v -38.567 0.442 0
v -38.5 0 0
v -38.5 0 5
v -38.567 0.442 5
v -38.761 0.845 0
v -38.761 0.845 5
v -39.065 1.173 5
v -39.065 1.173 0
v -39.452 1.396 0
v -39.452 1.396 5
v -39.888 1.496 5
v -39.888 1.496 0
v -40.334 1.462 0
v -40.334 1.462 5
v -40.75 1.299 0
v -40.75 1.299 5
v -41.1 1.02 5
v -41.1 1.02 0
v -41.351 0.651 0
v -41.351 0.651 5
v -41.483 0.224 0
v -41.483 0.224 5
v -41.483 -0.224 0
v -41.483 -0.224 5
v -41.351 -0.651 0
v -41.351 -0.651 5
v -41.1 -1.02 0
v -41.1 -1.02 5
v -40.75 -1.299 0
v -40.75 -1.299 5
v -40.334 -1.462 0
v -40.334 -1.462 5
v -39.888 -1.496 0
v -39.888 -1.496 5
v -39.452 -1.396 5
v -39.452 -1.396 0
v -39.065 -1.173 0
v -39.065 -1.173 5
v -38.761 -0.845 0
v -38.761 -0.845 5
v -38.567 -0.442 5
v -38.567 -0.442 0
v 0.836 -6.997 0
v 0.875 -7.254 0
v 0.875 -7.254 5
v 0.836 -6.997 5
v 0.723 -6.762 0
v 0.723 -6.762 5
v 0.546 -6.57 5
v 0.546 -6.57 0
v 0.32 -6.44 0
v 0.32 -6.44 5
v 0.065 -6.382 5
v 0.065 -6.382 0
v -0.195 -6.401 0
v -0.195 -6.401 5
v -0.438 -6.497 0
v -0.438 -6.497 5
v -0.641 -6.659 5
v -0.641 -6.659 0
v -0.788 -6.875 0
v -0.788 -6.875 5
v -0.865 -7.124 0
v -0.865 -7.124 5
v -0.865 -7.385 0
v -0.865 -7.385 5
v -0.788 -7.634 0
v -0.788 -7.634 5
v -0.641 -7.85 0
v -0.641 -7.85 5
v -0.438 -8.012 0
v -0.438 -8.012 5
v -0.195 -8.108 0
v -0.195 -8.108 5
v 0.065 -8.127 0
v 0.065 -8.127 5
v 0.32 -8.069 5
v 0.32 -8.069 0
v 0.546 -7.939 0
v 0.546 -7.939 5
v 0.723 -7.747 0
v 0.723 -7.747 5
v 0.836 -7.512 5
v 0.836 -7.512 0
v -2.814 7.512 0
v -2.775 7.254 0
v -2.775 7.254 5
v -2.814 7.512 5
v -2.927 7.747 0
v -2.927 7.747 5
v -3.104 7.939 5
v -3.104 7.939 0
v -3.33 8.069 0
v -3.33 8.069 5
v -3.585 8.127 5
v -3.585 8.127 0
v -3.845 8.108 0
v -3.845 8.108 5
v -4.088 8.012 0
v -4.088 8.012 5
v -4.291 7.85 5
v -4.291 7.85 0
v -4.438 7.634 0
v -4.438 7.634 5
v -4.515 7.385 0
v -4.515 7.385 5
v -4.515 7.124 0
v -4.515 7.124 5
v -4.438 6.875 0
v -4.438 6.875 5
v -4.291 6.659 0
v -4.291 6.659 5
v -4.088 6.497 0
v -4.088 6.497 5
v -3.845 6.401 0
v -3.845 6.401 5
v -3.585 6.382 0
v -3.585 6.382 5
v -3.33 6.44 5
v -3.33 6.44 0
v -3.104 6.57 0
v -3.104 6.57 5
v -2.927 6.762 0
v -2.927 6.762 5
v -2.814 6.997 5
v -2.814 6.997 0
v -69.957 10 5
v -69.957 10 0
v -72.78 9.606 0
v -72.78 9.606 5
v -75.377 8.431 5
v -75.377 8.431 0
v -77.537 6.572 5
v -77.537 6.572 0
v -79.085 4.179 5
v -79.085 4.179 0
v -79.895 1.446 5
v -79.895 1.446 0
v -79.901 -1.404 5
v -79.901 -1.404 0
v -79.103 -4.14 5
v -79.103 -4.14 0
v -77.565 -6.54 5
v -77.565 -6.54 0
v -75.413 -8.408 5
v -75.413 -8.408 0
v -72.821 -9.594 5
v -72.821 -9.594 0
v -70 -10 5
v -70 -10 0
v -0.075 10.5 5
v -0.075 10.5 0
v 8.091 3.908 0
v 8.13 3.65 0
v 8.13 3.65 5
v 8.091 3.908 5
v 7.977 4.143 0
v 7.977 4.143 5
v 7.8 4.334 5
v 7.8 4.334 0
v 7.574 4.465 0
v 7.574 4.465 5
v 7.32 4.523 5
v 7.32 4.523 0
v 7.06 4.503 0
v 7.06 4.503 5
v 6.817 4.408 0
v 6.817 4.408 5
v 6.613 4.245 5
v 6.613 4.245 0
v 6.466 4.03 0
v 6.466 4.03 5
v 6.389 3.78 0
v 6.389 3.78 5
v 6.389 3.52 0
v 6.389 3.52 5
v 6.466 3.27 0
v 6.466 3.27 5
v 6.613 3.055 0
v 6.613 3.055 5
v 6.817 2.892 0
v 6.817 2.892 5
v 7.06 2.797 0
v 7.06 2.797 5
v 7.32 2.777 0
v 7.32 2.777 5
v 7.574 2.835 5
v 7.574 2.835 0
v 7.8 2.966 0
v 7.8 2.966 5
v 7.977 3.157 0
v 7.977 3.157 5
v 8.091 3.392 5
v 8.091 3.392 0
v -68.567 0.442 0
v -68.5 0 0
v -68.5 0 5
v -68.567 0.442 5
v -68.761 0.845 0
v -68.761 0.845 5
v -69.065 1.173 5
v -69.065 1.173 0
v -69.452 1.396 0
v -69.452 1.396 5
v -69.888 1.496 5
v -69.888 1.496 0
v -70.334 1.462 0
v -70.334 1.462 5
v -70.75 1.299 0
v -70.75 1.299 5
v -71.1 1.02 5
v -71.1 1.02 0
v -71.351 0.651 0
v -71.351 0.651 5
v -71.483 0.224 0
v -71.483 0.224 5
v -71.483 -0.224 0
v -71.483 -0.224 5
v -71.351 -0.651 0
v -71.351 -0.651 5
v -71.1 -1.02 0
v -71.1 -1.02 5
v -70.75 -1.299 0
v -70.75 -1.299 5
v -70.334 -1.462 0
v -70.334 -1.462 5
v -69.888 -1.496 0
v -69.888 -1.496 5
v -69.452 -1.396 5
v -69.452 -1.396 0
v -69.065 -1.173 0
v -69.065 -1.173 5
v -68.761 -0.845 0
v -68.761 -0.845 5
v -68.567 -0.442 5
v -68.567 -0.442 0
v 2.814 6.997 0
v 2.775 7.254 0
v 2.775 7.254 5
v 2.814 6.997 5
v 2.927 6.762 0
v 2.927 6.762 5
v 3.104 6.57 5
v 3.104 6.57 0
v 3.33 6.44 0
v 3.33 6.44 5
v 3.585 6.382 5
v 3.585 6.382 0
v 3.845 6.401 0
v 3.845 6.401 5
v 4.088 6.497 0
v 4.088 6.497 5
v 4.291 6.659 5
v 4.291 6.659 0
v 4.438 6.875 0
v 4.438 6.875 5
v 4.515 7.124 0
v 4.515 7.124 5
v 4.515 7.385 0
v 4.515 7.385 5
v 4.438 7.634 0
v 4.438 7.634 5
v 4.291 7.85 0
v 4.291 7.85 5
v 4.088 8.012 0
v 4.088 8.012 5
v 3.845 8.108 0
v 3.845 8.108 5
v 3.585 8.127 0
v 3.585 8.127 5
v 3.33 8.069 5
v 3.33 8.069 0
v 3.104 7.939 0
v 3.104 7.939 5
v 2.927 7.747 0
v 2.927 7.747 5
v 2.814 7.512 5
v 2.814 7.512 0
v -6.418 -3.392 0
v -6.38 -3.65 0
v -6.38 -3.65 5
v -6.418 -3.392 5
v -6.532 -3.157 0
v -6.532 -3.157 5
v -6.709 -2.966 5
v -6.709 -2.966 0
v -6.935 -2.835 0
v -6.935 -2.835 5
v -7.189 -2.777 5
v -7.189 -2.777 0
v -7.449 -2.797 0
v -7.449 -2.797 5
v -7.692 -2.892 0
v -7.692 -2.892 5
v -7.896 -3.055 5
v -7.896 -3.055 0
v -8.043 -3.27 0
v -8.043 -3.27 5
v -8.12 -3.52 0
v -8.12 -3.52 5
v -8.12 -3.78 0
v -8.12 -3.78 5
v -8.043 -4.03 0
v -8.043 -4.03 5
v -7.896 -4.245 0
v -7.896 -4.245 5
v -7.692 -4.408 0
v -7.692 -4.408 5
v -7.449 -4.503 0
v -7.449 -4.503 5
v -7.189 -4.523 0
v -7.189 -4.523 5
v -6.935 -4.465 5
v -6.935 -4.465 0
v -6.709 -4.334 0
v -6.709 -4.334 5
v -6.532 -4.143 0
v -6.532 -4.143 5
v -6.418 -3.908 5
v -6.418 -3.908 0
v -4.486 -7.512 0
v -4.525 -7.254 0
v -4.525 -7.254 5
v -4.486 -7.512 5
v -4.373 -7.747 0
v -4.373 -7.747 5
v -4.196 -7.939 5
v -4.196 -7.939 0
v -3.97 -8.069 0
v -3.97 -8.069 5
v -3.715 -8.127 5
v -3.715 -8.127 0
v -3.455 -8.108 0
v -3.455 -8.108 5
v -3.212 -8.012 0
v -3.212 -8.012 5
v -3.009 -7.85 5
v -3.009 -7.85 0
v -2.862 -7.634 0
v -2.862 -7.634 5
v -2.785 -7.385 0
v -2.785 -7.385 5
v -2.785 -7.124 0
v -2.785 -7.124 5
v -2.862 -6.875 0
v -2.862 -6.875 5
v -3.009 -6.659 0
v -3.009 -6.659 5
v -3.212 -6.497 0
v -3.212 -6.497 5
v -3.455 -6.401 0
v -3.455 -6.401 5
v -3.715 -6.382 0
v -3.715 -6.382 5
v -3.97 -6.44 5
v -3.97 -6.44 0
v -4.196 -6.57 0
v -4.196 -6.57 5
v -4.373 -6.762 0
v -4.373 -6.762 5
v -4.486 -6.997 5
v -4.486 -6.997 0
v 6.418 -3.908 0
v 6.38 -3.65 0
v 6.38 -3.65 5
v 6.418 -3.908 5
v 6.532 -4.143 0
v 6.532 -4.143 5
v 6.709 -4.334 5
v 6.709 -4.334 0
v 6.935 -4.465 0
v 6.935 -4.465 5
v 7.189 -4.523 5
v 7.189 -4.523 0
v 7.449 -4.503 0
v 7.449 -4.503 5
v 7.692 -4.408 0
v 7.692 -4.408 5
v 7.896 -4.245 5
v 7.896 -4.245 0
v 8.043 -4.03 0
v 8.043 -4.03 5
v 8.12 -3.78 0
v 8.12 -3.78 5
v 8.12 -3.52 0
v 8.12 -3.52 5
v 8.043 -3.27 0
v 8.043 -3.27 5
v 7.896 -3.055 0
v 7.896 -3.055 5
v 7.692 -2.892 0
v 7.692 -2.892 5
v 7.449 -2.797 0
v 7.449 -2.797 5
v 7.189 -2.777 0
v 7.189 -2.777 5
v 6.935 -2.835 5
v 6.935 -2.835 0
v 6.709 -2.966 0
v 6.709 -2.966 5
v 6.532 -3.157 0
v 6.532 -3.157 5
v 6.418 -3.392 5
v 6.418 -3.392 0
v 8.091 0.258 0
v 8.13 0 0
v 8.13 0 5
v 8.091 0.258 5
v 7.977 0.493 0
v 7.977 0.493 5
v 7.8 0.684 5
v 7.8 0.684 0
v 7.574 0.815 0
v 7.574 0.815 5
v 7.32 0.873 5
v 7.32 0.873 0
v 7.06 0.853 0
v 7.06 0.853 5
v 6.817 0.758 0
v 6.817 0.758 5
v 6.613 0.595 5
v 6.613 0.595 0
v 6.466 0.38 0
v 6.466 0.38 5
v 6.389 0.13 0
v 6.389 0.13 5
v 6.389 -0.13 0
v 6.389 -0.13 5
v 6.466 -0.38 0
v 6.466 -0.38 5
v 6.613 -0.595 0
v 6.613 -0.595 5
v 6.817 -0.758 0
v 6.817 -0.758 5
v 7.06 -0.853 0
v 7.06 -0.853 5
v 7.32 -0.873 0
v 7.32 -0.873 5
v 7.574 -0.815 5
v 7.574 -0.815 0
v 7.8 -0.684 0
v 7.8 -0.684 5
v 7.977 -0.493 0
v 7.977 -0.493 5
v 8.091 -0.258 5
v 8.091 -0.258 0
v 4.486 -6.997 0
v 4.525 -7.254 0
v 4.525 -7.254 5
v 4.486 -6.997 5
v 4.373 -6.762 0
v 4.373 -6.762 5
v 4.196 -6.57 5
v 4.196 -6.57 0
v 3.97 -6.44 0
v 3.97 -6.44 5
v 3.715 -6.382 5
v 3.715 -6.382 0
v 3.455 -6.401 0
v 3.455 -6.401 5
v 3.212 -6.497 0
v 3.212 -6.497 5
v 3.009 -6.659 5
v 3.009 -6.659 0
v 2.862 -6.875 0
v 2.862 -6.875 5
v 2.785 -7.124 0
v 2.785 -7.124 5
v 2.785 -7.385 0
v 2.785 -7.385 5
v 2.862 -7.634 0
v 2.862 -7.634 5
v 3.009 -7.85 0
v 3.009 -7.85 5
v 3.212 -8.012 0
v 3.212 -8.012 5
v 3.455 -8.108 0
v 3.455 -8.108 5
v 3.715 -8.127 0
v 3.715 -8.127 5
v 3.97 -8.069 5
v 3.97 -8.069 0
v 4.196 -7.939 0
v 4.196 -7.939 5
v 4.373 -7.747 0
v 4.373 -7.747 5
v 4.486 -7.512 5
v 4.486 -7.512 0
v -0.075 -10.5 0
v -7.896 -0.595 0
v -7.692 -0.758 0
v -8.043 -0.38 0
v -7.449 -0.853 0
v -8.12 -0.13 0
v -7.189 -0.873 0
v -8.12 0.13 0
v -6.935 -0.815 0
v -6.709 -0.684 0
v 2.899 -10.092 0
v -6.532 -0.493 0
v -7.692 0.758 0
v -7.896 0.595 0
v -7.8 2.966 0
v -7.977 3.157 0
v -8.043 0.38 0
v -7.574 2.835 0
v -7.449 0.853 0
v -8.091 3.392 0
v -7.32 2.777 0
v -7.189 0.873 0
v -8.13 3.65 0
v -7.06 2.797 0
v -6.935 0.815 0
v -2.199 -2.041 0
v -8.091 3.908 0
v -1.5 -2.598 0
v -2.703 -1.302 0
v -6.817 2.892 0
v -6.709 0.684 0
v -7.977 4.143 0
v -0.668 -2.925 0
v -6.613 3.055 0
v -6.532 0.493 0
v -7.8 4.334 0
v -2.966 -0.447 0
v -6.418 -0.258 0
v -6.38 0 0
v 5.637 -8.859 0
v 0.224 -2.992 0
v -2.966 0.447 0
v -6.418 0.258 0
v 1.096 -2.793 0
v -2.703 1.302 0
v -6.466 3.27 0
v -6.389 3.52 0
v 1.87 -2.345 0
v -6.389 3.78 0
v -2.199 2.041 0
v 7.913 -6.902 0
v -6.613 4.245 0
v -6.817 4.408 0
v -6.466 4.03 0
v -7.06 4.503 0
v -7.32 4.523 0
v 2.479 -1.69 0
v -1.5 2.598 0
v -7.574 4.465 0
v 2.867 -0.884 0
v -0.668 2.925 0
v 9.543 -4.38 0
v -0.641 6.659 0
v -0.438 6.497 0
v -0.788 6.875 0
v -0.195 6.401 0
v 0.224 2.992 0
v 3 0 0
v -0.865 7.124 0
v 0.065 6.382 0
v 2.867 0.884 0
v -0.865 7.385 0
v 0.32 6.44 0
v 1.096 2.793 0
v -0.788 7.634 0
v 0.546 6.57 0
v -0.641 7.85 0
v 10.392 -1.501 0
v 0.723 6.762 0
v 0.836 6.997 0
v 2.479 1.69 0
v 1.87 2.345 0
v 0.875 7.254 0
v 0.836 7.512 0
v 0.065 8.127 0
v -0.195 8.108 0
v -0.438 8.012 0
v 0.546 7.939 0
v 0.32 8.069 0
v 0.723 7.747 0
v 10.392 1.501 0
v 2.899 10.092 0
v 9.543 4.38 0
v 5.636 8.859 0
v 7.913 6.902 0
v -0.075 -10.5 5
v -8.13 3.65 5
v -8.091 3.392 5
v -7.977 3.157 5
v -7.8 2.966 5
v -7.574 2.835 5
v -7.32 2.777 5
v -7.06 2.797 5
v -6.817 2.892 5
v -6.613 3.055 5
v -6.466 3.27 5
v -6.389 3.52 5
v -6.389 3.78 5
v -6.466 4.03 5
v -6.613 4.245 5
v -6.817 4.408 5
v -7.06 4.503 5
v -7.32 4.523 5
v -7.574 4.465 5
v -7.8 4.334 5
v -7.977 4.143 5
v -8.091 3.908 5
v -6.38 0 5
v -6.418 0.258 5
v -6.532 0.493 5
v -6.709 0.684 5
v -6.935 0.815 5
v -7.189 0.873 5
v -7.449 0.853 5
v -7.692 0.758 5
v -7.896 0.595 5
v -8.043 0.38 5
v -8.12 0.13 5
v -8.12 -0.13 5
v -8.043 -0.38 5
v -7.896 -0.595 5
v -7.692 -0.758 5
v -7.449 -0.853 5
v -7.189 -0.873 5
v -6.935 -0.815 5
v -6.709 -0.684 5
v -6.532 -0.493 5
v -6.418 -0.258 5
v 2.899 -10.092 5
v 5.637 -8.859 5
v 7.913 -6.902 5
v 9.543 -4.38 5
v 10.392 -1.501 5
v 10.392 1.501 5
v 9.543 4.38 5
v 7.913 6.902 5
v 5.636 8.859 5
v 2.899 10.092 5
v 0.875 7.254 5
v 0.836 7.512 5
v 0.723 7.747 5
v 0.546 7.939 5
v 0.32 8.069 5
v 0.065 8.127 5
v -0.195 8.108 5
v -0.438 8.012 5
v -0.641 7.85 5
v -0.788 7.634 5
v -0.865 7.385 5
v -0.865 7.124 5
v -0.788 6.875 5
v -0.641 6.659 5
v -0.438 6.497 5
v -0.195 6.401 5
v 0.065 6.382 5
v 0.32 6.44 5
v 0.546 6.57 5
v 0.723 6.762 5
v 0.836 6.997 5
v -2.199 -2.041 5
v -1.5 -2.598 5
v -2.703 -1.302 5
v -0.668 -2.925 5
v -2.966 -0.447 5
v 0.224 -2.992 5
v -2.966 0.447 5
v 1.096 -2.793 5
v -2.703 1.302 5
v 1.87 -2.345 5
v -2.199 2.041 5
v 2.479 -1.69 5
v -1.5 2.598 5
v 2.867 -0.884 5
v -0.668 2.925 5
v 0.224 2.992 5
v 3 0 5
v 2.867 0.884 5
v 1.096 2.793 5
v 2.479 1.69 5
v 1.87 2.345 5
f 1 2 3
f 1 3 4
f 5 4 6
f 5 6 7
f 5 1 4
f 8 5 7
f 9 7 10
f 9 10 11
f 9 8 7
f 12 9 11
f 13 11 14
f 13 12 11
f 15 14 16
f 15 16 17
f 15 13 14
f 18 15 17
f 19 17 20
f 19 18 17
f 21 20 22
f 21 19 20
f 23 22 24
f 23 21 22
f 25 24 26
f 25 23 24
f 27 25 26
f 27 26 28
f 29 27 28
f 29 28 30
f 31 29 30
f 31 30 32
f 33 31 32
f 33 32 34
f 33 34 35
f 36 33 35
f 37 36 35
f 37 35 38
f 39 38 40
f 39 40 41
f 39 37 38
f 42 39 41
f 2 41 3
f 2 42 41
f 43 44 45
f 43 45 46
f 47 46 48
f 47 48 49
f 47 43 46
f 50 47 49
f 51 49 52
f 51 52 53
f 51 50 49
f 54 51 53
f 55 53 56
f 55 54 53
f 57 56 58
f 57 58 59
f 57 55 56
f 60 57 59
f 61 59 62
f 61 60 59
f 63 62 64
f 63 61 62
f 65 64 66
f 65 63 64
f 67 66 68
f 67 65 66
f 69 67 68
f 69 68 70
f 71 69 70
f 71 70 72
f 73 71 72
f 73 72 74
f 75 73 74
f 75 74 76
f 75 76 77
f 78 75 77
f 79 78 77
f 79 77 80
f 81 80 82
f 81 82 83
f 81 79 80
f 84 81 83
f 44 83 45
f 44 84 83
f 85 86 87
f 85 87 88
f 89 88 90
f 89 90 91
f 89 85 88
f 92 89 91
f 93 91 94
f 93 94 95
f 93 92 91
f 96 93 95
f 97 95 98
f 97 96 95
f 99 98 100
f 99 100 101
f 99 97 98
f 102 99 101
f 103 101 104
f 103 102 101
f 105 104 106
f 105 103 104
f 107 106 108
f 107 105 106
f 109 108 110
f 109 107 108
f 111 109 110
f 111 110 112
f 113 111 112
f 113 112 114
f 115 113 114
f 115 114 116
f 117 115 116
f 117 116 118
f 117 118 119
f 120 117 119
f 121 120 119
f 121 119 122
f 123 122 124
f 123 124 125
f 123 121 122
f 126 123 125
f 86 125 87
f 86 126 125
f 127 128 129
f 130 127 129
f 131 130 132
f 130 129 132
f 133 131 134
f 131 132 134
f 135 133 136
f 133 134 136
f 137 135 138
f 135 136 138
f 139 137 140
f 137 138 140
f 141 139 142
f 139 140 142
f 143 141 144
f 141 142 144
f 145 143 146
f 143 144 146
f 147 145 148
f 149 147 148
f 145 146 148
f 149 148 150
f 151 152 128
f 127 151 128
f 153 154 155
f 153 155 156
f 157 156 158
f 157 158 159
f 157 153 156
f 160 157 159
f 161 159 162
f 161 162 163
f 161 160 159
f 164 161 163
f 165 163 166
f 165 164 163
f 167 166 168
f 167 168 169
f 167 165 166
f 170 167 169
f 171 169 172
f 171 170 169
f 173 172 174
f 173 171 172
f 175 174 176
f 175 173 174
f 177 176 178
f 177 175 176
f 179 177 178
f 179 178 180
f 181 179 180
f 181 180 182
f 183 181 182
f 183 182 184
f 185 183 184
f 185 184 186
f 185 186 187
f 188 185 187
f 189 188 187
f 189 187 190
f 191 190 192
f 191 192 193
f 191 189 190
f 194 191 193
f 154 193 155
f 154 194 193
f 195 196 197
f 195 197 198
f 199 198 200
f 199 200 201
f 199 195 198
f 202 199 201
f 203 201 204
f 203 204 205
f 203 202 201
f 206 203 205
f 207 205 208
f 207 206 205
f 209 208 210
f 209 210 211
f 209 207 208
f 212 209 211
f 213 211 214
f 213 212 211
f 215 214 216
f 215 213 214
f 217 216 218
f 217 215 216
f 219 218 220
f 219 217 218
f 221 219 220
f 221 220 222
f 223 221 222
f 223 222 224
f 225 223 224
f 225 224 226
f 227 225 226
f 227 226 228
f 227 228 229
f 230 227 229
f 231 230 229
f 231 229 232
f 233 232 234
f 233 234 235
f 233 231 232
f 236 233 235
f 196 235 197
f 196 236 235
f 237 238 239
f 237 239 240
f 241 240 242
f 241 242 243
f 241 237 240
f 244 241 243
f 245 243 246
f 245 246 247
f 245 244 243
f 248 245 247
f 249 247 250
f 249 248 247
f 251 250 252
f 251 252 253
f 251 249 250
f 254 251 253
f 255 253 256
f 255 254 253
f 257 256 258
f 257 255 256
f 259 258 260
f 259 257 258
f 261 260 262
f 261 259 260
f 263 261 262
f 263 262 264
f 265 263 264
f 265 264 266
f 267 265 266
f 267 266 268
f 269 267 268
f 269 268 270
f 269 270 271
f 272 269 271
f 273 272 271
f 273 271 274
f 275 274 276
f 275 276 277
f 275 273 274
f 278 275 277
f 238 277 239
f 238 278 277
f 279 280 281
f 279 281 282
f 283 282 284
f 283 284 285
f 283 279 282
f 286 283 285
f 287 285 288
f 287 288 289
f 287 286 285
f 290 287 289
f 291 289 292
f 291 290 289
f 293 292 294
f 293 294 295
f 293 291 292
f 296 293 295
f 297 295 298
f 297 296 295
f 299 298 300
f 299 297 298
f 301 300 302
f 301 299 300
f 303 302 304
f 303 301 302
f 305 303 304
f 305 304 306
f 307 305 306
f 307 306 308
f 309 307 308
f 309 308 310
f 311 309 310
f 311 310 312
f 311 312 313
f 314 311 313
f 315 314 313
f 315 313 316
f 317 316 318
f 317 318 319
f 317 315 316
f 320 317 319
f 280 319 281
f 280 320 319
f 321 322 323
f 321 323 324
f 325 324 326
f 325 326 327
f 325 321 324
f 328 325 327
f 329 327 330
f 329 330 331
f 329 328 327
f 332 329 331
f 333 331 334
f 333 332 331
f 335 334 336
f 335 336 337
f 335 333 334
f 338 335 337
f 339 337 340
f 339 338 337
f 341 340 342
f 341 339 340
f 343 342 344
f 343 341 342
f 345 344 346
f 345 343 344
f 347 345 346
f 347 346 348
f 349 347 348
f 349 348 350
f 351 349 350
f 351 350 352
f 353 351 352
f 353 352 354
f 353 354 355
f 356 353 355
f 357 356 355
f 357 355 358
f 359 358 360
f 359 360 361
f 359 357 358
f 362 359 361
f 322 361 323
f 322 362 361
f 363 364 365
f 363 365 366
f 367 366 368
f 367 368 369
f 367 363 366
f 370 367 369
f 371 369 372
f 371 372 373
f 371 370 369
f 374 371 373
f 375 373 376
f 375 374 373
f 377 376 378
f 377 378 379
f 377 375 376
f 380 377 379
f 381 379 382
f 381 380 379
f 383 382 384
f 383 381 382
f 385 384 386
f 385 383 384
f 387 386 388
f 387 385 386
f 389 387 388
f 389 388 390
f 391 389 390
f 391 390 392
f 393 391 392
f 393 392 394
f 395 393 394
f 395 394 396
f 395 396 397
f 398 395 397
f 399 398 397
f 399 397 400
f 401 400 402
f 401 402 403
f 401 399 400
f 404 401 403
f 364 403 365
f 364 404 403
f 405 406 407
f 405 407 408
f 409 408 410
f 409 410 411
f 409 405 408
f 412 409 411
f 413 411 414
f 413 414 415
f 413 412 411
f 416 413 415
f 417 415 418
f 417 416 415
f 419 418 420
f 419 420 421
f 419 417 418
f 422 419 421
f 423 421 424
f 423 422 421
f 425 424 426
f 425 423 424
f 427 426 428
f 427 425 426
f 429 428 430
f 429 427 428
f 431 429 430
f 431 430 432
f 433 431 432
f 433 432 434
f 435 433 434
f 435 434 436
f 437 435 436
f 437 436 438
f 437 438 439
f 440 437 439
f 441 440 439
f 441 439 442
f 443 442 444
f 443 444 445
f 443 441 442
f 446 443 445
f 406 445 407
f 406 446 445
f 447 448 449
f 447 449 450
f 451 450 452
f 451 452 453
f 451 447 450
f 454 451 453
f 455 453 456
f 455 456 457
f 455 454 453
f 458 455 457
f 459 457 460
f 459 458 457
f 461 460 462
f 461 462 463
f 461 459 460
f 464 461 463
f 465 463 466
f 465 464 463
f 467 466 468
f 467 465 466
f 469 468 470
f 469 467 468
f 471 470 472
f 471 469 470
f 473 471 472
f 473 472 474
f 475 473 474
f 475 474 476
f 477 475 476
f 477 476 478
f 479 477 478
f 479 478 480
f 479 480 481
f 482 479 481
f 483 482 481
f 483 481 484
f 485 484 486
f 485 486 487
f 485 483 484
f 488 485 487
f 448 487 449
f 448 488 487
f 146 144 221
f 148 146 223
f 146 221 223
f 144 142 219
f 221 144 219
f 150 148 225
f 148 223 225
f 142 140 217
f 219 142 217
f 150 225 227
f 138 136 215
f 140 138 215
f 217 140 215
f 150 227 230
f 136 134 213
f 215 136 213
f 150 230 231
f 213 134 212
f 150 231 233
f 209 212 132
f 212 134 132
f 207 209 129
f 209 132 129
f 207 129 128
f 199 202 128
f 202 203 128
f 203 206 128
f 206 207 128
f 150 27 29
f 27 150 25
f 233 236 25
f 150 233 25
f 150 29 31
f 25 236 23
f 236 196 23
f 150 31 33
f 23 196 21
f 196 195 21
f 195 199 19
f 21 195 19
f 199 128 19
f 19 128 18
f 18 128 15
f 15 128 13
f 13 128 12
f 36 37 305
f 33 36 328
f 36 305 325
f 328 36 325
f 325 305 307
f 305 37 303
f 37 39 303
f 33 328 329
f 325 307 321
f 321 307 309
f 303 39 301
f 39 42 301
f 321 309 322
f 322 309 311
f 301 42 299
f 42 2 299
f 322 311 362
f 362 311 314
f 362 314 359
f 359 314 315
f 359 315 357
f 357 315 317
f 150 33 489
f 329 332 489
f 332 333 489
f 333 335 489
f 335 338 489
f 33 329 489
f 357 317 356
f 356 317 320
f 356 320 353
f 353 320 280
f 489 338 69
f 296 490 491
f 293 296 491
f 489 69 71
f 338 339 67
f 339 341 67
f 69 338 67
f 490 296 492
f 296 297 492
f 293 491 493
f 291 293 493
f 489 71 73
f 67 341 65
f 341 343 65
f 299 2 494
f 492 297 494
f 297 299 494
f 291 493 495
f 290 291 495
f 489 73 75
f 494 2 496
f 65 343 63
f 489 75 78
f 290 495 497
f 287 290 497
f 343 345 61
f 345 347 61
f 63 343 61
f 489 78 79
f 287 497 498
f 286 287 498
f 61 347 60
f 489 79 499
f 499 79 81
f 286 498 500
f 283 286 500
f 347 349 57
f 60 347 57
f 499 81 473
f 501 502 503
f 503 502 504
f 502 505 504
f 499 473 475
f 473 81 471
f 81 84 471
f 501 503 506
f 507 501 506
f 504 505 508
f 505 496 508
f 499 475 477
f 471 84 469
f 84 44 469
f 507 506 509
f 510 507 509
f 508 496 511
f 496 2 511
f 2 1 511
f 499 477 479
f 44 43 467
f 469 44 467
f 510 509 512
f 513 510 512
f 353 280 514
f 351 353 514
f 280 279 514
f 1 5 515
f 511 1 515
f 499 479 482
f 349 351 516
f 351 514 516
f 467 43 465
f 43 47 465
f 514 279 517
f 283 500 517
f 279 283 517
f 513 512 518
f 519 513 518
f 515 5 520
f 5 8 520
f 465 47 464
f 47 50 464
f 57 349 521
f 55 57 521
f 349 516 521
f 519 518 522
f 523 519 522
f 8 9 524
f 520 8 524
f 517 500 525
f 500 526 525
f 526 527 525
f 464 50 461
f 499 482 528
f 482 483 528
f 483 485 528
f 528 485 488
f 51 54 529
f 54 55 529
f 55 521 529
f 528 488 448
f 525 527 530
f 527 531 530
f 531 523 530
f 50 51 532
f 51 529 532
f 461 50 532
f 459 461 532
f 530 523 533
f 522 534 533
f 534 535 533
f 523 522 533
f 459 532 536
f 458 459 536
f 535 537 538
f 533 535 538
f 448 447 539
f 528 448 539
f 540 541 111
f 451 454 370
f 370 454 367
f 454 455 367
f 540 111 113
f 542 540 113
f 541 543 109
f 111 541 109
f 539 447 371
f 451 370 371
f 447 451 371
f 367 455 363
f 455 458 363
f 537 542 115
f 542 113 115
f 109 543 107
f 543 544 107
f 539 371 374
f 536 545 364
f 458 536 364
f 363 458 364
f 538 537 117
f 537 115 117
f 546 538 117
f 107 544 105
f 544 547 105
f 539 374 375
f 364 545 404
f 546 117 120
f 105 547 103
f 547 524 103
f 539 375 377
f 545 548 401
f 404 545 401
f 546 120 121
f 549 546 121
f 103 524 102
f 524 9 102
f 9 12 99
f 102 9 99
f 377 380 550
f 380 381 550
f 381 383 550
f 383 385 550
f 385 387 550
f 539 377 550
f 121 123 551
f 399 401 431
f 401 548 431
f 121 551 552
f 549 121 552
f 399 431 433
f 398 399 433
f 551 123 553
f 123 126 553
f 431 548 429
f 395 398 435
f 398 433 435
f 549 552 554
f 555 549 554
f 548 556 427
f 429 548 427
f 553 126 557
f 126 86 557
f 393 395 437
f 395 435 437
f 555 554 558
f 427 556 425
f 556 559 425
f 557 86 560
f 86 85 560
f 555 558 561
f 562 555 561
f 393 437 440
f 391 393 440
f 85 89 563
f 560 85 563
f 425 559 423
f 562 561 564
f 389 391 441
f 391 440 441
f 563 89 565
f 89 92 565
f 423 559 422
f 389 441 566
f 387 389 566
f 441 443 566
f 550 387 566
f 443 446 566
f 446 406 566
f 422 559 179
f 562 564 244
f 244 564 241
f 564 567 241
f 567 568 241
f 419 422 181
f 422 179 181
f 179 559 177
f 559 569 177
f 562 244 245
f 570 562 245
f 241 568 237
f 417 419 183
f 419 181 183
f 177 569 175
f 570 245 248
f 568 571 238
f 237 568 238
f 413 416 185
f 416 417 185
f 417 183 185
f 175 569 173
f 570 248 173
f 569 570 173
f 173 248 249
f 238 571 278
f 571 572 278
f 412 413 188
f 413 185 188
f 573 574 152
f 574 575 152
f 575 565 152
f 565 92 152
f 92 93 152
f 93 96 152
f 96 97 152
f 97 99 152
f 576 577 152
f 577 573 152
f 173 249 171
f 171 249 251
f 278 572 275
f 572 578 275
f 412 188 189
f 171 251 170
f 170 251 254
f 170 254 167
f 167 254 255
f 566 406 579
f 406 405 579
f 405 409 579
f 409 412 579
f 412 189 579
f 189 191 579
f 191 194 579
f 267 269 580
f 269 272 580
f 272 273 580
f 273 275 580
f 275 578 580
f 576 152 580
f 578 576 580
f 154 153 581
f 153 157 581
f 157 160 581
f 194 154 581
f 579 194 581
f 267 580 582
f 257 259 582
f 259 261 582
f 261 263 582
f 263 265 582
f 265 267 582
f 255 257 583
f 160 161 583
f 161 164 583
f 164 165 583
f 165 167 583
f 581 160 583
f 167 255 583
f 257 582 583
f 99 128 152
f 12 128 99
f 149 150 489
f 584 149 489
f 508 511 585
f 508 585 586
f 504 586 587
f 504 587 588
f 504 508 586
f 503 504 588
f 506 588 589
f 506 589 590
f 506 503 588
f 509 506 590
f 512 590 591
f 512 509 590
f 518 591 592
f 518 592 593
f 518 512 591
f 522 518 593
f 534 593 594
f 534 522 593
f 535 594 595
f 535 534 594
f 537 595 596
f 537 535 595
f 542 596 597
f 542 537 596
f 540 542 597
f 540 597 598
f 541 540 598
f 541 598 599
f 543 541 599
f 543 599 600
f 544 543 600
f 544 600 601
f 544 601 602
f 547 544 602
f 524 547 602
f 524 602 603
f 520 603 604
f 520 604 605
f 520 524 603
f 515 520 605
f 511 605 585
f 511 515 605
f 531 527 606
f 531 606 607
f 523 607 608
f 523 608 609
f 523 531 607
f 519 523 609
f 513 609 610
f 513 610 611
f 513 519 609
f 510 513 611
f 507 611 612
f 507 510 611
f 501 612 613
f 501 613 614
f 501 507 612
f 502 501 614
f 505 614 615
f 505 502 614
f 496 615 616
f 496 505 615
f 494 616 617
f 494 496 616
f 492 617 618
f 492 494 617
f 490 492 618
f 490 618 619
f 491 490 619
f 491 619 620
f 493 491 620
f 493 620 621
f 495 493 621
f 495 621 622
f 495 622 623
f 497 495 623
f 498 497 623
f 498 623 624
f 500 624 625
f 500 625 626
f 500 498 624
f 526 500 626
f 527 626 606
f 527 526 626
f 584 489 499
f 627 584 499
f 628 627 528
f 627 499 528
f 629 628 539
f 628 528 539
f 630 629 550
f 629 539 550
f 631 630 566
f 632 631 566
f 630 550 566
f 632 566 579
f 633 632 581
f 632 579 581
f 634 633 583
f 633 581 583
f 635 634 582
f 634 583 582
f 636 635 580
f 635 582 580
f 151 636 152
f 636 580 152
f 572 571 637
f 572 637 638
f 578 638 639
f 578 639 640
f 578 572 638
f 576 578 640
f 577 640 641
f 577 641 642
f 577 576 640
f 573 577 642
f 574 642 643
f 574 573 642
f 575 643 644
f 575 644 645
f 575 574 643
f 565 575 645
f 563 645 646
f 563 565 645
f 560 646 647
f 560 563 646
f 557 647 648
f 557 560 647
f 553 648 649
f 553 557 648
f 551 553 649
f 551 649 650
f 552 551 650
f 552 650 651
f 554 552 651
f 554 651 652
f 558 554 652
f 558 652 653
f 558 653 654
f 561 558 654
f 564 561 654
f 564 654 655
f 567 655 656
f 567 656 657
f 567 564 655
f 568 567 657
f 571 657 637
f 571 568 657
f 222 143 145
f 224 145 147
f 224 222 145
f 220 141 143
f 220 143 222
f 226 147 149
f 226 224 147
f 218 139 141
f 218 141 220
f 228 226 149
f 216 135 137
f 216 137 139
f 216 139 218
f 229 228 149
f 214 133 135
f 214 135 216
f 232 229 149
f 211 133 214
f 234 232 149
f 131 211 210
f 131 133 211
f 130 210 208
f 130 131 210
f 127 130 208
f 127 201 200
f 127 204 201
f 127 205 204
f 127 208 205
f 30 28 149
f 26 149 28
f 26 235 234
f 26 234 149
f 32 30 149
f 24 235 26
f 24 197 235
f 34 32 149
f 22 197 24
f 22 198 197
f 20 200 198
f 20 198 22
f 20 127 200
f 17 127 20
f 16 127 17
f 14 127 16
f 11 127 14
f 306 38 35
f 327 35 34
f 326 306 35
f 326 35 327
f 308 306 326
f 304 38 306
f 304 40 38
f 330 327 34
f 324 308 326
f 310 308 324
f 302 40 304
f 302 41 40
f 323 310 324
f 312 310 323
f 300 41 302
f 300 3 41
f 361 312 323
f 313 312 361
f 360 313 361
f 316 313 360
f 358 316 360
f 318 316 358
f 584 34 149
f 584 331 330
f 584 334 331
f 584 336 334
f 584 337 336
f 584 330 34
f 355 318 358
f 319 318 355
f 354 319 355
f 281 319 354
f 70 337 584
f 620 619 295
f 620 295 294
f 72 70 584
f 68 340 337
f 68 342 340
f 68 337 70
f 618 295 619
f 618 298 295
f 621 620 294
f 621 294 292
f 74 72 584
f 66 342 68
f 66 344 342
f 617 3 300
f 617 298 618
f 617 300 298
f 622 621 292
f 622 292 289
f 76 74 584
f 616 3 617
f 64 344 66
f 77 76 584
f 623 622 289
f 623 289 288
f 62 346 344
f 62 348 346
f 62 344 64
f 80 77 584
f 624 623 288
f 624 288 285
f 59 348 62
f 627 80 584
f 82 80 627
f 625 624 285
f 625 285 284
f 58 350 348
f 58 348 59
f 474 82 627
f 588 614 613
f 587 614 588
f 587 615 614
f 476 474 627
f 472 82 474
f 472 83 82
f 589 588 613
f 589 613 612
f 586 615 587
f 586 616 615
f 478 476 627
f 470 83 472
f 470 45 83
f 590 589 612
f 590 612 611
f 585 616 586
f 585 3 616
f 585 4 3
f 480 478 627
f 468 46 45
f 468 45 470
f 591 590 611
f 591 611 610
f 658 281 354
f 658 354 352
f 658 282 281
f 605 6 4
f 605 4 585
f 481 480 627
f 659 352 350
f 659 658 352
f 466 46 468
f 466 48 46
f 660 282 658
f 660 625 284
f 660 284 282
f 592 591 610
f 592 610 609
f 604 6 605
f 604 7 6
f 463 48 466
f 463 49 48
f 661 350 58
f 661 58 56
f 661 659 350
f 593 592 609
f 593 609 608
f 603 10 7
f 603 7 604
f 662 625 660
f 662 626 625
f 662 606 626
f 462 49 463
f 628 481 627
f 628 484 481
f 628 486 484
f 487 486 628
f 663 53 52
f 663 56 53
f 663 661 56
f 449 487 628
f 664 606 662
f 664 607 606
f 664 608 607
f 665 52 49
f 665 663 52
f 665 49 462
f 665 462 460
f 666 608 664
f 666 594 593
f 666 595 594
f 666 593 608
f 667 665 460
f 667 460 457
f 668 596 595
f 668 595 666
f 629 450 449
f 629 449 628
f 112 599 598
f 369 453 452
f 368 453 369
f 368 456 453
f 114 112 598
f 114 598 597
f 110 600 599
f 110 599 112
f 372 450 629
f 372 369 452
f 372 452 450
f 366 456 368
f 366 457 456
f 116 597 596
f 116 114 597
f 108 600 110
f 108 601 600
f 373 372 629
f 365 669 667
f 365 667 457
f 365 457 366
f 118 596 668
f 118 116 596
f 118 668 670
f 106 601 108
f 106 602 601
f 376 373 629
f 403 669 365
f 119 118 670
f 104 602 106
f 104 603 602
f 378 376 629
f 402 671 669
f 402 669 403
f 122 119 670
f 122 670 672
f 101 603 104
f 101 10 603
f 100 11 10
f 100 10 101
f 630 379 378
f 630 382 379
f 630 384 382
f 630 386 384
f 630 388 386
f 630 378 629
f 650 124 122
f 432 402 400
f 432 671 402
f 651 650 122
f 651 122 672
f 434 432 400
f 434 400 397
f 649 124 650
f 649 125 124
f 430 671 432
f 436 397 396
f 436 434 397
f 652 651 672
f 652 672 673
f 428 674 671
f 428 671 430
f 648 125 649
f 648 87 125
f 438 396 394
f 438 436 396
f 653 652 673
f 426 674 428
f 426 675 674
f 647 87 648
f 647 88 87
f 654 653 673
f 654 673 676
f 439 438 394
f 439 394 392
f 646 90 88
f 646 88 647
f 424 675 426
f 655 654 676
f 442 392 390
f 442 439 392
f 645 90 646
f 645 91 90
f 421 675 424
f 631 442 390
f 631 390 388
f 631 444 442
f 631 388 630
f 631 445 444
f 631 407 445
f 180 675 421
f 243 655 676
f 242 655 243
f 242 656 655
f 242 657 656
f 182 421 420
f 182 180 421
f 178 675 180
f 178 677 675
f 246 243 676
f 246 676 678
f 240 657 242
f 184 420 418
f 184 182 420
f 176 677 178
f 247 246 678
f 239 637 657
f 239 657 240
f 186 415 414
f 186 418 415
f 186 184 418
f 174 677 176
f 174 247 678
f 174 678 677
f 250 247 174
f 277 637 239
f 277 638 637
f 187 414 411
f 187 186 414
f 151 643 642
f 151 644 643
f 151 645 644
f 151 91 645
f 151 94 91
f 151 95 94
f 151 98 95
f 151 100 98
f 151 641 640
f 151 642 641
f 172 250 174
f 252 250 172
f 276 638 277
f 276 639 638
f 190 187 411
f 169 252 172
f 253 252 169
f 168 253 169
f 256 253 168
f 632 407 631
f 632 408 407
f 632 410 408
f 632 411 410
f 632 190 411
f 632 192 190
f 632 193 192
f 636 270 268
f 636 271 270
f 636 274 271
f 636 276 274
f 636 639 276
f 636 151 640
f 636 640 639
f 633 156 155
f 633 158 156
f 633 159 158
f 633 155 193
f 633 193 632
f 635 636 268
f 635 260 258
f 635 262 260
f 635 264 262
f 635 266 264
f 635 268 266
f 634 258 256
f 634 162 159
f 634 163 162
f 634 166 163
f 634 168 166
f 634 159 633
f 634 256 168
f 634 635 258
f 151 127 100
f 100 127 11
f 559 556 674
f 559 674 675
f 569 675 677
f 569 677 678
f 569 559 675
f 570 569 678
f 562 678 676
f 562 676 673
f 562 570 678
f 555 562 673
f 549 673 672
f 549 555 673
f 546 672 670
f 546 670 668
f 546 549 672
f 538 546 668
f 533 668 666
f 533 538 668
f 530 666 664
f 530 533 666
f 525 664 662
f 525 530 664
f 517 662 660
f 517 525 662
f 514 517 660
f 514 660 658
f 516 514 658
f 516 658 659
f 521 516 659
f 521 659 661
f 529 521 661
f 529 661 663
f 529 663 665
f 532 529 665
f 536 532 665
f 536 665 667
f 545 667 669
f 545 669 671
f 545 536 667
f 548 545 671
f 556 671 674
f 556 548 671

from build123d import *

# Parameters (mm, degrees)
ESQUISSE1_R        = 0.875
ESQUISSE1_R_2      = 1.5
ESQUISSE1_R_3      = 3
BOSS_EXTRU_1_DEPTH = 5


with BuildPart() as part:
    # Esquisse1 → Boss.-Extru.1 (new body)
    with BuildSketch(Plane.XY):
        with BuildLine():
            Line((-70, -10), (-0.075038305, -10.499731866))
            ThreePointArc((-0.075038305, -10.499731866), (10.5, 2.989e-05), (-0.075098083, 10.499731438))
            Line((-0.075098083, 10.499731438), (-69.957164253, 9.999908255))
            ThreePointArc((-69.957164253, 9.999908255), (-79.999977064, 0.021417923), (-70, -10))
        make_face()
        with Locations((7.2545, 3.65)):
            Circle(ESQUISSE1_R, mode=Mode.SUBTRACT)
        with Locations((7.2545, 0)):
            Circle(ESQUISSE1_R, mode=Mode.SUBTRACT)
        with Locations(Location((7.2545, -3.65, 0), (0, 0, 180))):
            Circle(ESQUISSE1_R, mode=Mode.SUBTRACT)
        with Locations((3.65, -7.2545)):
            Circle(ESQUISSE1_R, mode=Mode.SUBTRACT)
        with Locations((0, -7.2545)):
            Circle(ESQUISSE1_R, mode=Mode.SUBTRACT)
        with Locations(Location((-3.65, -7.2545, 0), (0, 0, 180))):
            Circle(ESQUISSE1_R, mode=Mode.SUBTRACT)
        with Locations((-7.2545, -3.65)):
            Circle(ESQUISSE1_R, mode=Mode.SUBTRACT)
        with Locations((-7.2545, 0)):
            Circle(ESQUISSE1_R, mode=Mode.SUBTRACT)
        with Locations(Location((-7.2545, 3.65, 0), (0, 0, 180))):
            Circle(ESQUISSE1_R, mode=Mode.SUBTRACT)
        with Locations((-3.65, 7.2545)):
            Circle(ESQUISSE1_R, mode=Mode.SUBTRACT)
        with Locations((0, 7.2545)):
            Circle(ESQUISSE1_R, mode=Mode.SUBTRACT)
        with Locations(Location((3.65, 7.2545, 0), (0, 0, 180))):
            Circle(ESQUISSE1_R, mode=Mode.SUBTRACT)
        with Locations((-70, 0)):
            Circle(ESQUISSE1_R_2, mode=Mode.SUBTRACT)
        with Locations((-40, 0)):
            Circle(ESQUISSE1_R_2, mode=Mode.SUBTRACT)
        Circle(ESQUISSE1_R_3, mode=Mode.SUBTRACT)
    extrude(amount=BOSS_EXTRU_1_DEPTH)


solid = part.part
